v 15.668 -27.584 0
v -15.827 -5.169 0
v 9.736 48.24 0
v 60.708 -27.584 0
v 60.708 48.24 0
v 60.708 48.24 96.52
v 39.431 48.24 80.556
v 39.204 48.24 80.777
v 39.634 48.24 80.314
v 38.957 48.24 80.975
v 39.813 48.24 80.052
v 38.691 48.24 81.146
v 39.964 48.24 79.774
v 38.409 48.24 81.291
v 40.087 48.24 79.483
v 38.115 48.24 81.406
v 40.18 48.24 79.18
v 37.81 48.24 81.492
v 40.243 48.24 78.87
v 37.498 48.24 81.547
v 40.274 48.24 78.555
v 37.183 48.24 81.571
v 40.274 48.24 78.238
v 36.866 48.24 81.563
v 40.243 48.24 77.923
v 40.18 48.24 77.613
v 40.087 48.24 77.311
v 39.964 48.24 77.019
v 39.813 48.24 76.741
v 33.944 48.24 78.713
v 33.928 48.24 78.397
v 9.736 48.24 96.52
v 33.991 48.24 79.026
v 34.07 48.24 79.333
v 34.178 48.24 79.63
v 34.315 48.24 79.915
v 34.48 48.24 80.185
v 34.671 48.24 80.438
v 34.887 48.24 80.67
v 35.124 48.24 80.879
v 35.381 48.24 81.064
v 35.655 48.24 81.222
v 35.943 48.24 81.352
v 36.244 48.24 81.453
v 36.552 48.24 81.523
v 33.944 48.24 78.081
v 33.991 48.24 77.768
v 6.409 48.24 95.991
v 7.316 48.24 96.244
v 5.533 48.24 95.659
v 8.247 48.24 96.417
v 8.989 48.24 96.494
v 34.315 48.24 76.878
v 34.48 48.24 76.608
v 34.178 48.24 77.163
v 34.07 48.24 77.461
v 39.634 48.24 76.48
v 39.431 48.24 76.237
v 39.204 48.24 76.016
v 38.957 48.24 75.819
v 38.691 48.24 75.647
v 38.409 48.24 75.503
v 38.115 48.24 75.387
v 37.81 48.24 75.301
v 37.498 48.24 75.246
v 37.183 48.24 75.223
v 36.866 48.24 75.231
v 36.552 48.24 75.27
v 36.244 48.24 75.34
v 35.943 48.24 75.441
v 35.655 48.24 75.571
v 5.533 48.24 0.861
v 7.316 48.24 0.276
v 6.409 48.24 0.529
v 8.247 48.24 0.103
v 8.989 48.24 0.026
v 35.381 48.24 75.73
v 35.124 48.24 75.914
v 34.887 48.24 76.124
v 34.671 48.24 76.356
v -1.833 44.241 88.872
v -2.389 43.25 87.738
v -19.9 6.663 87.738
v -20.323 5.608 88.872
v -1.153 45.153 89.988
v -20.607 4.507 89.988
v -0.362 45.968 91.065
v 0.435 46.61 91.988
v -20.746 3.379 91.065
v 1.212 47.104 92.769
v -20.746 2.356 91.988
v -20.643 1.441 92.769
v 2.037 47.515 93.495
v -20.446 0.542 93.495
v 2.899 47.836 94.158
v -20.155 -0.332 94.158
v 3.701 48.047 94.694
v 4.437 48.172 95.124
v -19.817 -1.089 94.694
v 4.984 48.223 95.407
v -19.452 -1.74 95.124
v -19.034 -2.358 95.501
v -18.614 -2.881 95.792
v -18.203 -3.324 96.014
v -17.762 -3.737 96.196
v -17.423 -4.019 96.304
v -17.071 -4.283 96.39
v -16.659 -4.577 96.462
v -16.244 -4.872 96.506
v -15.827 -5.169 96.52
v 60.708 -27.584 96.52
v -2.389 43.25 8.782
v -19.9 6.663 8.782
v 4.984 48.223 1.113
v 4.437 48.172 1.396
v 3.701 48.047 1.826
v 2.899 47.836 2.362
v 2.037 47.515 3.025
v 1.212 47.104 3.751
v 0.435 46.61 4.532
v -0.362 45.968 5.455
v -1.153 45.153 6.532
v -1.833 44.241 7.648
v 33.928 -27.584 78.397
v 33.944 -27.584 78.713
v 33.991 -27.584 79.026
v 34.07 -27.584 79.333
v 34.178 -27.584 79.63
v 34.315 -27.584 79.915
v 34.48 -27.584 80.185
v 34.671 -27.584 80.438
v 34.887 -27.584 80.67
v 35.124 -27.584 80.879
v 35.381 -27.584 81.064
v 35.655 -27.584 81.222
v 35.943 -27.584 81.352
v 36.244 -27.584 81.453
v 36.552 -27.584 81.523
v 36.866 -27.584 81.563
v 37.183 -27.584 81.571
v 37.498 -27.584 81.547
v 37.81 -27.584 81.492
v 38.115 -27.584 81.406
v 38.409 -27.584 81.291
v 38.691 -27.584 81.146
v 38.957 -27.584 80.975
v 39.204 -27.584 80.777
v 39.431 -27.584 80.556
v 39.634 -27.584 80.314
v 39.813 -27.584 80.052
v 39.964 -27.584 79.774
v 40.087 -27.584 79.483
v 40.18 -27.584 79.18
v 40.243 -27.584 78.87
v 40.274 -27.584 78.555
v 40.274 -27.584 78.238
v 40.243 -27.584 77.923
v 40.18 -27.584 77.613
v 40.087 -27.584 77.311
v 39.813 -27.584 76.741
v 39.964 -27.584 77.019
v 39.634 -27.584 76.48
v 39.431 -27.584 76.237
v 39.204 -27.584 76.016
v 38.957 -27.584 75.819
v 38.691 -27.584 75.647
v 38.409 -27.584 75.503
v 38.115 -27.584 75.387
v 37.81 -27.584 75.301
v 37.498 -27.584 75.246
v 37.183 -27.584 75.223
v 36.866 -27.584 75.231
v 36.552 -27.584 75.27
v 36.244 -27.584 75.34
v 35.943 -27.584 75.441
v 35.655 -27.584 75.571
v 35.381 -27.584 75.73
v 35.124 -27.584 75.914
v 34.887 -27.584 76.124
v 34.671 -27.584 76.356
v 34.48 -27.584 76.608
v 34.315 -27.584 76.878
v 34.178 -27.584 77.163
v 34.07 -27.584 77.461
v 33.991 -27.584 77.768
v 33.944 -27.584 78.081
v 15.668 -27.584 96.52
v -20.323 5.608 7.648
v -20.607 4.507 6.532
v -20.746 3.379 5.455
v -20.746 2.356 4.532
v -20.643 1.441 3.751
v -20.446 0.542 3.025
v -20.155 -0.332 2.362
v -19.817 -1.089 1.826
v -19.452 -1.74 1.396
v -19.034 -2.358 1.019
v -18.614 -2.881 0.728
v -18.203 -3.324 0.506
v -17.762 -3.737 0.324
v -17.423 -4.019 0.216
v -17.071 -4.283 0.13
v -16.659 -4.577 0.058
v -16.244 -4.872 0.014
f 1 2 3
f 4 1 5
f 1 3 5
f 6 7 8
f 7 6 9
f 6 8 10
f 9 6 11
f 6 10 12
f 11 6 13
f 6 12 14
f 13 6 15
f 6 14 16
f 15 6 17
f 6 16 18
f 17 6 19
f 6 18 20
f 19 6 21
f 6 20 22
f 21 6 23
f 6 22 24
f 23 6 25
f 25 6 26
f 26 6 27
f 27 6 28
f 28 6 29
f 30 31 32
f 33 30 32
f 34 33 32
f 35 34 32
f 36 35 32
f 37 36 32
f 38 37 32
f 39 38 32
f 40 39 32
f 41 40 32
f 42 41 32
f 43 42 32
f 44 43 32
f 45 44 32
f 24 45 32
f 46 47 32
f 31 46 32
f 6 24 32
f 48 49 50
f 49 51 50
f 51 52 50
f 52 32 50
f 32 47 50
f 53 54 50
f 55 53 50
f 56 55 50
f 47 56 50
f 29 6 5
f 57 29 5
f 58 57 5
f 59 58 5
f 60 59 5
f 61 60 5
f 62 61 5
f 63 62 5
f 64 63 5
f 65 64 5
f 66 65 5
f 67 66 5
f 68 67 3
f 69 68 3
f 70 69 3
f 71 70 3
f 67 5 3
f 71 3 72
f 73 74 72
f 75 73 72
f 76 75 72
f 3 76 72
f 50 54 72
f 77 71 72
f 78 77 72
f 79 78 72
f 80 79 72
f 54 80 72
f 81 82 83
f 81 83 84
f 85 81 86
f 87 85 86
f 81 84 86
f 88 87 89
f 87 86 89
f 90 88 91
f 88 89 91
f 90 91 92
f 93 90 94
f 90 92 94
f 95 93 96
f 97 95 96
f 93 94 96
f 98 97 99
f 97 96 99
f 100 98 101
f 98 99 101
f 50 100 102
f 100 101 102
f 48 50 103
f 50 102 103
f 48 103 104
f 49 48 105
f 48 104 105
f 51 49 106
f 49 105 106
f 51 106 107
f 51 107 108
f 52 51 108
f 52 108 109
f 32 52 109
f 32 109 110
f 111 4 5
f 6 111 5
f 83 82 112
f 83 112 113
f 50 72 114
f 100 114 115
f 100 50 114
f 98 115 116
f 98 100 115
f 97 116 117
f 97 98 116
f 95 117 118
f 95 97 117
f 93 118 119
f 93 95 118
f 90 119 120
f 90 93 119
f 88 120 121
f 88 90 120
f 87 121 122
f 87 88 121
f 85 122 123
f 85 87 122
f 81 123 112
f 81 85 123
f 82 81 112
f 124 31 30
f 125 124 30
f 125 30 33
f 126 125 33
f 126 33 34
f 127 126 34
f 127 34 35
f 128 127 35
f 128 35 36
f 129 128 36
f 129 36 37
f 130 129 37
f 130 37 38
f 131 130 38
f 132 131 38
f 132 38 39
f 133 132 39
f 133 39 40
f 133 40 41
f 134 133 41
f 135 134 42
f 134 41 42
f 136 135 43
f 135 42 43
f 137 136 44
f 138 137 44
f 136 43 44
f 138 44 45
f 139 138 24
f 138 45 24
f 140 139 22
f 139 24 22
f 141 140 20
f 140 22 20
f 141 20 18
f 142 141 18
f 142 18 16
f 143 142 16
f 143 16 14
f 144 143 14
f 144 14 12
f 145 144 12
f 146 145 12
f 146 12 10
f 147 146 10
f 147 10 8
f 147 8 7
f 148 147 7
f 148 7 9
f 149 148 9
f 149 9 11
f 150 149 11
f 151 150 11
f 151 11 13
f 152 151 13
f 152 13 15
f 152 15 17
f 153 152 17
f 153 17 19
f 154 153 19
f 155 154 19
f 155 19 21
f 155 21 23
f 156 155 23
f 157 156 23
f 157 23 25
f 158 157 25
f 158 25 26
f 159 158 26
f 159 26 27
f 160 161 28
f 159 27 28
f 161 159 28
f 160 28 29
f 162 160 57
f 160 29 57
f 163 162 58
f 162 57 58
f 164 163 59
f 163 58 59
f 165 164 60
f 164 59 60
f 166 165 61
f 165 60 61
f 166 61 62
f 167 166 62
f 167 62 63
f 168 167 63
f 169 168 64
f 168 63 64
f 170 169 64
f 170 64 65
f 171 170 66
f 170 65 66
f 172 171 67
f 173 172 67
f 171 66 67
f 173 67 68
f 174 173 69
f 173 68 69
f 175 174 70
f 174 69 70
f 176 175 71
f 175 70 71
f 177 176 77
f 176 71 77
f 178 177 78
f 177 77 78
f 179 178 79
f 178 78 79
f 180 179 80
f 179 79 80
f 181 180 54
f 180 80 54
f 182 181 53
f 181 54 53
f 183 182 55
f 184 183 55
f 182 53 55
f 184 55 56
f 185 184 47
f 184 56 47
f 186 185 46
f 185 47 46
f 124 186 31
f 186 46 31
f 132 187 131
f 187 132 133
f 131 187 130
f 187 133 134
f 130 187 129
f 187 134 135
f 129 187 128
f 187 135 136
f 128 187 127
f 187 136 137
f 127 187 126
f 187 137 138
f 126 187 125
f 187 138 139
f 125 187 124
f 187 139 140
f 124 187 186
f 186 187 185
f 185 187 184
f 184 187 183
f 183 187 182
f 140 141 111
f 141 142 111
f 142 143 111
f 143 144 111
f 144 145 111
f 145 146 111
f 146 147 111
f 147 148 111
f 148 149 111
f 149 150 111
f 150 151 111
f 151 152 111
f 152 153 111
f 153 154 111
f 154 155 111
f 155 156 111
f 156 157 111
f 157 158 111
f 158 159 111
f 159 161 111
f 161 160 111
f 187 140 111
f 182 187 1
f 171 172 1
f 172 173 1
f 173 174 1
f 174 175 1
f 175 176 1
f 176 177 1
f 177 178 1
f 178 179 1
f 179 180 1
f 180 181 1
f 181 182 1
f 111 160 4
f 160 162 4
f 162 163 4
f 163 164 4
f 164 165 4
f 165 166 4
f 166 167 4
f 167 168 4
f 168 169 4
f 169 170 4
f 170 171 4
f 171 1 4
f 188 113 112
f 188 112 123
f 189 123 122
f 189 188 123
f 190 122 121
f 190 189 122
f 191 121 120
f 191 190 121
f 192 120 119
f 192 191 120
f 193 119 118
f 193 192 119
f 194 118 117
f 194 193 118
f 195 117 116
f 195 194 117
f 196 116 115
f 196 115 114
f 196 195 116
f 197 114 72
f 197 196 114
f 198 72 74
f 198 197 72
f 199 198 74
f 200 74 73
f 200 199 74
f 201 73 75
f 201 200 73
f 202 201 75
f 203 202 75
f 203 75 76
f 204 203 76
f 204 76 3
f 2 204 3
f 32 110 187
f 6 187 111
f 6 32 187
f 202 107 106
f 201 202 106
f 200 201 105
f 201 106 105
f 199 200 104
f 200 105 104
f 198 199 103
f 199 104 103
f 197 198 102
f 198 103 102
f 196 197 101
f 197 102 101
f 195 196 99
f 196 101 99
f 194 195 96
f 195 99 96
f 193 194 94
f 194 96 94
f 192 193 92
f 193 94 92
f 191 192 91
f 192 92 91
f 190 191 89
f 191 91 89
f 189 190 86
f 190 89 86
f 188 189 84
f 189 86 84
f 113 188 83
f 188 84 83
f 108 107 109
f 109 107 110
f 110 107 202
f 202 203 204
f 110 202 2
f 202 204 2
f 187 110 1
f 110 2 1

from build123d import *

# Parameters (mm, degrees)
F1_DEPTH = 96.519992
F2_R     = 8.781853
F4_D     = 6.35


with BuildPart() as f1:
    # F0 (on Top) → F1 (new body)
    with BuildSketch(Plane.XY):
        Polygon((-23.089193, 0), (15.667696, -27.583569), (60.70821, -27.583569), (60.70821, 48.24049), (0, 48.24049), align=None)
    extrude(amount=F1_DEPTH)

    # F2
    f2_edges = [f1.edges().sort_by_distance(p)[0] for p in [
        (0, 48.24049, 48.259996),
        (-23.089193, 0, 48.259996),
        (-11.544596, 24.120245, 0),
        (-11.544596, 24.120245, 96.519992),
    ]]
    fillet(f2_edges, radius=F2_R)

    # F4 (through all)
    with Locations(Plane.XZ.offset(27.583569)):
        with Locations((37.103444, 78.396708)):
            Hole(F4_D / 2)


solid = f1.part
